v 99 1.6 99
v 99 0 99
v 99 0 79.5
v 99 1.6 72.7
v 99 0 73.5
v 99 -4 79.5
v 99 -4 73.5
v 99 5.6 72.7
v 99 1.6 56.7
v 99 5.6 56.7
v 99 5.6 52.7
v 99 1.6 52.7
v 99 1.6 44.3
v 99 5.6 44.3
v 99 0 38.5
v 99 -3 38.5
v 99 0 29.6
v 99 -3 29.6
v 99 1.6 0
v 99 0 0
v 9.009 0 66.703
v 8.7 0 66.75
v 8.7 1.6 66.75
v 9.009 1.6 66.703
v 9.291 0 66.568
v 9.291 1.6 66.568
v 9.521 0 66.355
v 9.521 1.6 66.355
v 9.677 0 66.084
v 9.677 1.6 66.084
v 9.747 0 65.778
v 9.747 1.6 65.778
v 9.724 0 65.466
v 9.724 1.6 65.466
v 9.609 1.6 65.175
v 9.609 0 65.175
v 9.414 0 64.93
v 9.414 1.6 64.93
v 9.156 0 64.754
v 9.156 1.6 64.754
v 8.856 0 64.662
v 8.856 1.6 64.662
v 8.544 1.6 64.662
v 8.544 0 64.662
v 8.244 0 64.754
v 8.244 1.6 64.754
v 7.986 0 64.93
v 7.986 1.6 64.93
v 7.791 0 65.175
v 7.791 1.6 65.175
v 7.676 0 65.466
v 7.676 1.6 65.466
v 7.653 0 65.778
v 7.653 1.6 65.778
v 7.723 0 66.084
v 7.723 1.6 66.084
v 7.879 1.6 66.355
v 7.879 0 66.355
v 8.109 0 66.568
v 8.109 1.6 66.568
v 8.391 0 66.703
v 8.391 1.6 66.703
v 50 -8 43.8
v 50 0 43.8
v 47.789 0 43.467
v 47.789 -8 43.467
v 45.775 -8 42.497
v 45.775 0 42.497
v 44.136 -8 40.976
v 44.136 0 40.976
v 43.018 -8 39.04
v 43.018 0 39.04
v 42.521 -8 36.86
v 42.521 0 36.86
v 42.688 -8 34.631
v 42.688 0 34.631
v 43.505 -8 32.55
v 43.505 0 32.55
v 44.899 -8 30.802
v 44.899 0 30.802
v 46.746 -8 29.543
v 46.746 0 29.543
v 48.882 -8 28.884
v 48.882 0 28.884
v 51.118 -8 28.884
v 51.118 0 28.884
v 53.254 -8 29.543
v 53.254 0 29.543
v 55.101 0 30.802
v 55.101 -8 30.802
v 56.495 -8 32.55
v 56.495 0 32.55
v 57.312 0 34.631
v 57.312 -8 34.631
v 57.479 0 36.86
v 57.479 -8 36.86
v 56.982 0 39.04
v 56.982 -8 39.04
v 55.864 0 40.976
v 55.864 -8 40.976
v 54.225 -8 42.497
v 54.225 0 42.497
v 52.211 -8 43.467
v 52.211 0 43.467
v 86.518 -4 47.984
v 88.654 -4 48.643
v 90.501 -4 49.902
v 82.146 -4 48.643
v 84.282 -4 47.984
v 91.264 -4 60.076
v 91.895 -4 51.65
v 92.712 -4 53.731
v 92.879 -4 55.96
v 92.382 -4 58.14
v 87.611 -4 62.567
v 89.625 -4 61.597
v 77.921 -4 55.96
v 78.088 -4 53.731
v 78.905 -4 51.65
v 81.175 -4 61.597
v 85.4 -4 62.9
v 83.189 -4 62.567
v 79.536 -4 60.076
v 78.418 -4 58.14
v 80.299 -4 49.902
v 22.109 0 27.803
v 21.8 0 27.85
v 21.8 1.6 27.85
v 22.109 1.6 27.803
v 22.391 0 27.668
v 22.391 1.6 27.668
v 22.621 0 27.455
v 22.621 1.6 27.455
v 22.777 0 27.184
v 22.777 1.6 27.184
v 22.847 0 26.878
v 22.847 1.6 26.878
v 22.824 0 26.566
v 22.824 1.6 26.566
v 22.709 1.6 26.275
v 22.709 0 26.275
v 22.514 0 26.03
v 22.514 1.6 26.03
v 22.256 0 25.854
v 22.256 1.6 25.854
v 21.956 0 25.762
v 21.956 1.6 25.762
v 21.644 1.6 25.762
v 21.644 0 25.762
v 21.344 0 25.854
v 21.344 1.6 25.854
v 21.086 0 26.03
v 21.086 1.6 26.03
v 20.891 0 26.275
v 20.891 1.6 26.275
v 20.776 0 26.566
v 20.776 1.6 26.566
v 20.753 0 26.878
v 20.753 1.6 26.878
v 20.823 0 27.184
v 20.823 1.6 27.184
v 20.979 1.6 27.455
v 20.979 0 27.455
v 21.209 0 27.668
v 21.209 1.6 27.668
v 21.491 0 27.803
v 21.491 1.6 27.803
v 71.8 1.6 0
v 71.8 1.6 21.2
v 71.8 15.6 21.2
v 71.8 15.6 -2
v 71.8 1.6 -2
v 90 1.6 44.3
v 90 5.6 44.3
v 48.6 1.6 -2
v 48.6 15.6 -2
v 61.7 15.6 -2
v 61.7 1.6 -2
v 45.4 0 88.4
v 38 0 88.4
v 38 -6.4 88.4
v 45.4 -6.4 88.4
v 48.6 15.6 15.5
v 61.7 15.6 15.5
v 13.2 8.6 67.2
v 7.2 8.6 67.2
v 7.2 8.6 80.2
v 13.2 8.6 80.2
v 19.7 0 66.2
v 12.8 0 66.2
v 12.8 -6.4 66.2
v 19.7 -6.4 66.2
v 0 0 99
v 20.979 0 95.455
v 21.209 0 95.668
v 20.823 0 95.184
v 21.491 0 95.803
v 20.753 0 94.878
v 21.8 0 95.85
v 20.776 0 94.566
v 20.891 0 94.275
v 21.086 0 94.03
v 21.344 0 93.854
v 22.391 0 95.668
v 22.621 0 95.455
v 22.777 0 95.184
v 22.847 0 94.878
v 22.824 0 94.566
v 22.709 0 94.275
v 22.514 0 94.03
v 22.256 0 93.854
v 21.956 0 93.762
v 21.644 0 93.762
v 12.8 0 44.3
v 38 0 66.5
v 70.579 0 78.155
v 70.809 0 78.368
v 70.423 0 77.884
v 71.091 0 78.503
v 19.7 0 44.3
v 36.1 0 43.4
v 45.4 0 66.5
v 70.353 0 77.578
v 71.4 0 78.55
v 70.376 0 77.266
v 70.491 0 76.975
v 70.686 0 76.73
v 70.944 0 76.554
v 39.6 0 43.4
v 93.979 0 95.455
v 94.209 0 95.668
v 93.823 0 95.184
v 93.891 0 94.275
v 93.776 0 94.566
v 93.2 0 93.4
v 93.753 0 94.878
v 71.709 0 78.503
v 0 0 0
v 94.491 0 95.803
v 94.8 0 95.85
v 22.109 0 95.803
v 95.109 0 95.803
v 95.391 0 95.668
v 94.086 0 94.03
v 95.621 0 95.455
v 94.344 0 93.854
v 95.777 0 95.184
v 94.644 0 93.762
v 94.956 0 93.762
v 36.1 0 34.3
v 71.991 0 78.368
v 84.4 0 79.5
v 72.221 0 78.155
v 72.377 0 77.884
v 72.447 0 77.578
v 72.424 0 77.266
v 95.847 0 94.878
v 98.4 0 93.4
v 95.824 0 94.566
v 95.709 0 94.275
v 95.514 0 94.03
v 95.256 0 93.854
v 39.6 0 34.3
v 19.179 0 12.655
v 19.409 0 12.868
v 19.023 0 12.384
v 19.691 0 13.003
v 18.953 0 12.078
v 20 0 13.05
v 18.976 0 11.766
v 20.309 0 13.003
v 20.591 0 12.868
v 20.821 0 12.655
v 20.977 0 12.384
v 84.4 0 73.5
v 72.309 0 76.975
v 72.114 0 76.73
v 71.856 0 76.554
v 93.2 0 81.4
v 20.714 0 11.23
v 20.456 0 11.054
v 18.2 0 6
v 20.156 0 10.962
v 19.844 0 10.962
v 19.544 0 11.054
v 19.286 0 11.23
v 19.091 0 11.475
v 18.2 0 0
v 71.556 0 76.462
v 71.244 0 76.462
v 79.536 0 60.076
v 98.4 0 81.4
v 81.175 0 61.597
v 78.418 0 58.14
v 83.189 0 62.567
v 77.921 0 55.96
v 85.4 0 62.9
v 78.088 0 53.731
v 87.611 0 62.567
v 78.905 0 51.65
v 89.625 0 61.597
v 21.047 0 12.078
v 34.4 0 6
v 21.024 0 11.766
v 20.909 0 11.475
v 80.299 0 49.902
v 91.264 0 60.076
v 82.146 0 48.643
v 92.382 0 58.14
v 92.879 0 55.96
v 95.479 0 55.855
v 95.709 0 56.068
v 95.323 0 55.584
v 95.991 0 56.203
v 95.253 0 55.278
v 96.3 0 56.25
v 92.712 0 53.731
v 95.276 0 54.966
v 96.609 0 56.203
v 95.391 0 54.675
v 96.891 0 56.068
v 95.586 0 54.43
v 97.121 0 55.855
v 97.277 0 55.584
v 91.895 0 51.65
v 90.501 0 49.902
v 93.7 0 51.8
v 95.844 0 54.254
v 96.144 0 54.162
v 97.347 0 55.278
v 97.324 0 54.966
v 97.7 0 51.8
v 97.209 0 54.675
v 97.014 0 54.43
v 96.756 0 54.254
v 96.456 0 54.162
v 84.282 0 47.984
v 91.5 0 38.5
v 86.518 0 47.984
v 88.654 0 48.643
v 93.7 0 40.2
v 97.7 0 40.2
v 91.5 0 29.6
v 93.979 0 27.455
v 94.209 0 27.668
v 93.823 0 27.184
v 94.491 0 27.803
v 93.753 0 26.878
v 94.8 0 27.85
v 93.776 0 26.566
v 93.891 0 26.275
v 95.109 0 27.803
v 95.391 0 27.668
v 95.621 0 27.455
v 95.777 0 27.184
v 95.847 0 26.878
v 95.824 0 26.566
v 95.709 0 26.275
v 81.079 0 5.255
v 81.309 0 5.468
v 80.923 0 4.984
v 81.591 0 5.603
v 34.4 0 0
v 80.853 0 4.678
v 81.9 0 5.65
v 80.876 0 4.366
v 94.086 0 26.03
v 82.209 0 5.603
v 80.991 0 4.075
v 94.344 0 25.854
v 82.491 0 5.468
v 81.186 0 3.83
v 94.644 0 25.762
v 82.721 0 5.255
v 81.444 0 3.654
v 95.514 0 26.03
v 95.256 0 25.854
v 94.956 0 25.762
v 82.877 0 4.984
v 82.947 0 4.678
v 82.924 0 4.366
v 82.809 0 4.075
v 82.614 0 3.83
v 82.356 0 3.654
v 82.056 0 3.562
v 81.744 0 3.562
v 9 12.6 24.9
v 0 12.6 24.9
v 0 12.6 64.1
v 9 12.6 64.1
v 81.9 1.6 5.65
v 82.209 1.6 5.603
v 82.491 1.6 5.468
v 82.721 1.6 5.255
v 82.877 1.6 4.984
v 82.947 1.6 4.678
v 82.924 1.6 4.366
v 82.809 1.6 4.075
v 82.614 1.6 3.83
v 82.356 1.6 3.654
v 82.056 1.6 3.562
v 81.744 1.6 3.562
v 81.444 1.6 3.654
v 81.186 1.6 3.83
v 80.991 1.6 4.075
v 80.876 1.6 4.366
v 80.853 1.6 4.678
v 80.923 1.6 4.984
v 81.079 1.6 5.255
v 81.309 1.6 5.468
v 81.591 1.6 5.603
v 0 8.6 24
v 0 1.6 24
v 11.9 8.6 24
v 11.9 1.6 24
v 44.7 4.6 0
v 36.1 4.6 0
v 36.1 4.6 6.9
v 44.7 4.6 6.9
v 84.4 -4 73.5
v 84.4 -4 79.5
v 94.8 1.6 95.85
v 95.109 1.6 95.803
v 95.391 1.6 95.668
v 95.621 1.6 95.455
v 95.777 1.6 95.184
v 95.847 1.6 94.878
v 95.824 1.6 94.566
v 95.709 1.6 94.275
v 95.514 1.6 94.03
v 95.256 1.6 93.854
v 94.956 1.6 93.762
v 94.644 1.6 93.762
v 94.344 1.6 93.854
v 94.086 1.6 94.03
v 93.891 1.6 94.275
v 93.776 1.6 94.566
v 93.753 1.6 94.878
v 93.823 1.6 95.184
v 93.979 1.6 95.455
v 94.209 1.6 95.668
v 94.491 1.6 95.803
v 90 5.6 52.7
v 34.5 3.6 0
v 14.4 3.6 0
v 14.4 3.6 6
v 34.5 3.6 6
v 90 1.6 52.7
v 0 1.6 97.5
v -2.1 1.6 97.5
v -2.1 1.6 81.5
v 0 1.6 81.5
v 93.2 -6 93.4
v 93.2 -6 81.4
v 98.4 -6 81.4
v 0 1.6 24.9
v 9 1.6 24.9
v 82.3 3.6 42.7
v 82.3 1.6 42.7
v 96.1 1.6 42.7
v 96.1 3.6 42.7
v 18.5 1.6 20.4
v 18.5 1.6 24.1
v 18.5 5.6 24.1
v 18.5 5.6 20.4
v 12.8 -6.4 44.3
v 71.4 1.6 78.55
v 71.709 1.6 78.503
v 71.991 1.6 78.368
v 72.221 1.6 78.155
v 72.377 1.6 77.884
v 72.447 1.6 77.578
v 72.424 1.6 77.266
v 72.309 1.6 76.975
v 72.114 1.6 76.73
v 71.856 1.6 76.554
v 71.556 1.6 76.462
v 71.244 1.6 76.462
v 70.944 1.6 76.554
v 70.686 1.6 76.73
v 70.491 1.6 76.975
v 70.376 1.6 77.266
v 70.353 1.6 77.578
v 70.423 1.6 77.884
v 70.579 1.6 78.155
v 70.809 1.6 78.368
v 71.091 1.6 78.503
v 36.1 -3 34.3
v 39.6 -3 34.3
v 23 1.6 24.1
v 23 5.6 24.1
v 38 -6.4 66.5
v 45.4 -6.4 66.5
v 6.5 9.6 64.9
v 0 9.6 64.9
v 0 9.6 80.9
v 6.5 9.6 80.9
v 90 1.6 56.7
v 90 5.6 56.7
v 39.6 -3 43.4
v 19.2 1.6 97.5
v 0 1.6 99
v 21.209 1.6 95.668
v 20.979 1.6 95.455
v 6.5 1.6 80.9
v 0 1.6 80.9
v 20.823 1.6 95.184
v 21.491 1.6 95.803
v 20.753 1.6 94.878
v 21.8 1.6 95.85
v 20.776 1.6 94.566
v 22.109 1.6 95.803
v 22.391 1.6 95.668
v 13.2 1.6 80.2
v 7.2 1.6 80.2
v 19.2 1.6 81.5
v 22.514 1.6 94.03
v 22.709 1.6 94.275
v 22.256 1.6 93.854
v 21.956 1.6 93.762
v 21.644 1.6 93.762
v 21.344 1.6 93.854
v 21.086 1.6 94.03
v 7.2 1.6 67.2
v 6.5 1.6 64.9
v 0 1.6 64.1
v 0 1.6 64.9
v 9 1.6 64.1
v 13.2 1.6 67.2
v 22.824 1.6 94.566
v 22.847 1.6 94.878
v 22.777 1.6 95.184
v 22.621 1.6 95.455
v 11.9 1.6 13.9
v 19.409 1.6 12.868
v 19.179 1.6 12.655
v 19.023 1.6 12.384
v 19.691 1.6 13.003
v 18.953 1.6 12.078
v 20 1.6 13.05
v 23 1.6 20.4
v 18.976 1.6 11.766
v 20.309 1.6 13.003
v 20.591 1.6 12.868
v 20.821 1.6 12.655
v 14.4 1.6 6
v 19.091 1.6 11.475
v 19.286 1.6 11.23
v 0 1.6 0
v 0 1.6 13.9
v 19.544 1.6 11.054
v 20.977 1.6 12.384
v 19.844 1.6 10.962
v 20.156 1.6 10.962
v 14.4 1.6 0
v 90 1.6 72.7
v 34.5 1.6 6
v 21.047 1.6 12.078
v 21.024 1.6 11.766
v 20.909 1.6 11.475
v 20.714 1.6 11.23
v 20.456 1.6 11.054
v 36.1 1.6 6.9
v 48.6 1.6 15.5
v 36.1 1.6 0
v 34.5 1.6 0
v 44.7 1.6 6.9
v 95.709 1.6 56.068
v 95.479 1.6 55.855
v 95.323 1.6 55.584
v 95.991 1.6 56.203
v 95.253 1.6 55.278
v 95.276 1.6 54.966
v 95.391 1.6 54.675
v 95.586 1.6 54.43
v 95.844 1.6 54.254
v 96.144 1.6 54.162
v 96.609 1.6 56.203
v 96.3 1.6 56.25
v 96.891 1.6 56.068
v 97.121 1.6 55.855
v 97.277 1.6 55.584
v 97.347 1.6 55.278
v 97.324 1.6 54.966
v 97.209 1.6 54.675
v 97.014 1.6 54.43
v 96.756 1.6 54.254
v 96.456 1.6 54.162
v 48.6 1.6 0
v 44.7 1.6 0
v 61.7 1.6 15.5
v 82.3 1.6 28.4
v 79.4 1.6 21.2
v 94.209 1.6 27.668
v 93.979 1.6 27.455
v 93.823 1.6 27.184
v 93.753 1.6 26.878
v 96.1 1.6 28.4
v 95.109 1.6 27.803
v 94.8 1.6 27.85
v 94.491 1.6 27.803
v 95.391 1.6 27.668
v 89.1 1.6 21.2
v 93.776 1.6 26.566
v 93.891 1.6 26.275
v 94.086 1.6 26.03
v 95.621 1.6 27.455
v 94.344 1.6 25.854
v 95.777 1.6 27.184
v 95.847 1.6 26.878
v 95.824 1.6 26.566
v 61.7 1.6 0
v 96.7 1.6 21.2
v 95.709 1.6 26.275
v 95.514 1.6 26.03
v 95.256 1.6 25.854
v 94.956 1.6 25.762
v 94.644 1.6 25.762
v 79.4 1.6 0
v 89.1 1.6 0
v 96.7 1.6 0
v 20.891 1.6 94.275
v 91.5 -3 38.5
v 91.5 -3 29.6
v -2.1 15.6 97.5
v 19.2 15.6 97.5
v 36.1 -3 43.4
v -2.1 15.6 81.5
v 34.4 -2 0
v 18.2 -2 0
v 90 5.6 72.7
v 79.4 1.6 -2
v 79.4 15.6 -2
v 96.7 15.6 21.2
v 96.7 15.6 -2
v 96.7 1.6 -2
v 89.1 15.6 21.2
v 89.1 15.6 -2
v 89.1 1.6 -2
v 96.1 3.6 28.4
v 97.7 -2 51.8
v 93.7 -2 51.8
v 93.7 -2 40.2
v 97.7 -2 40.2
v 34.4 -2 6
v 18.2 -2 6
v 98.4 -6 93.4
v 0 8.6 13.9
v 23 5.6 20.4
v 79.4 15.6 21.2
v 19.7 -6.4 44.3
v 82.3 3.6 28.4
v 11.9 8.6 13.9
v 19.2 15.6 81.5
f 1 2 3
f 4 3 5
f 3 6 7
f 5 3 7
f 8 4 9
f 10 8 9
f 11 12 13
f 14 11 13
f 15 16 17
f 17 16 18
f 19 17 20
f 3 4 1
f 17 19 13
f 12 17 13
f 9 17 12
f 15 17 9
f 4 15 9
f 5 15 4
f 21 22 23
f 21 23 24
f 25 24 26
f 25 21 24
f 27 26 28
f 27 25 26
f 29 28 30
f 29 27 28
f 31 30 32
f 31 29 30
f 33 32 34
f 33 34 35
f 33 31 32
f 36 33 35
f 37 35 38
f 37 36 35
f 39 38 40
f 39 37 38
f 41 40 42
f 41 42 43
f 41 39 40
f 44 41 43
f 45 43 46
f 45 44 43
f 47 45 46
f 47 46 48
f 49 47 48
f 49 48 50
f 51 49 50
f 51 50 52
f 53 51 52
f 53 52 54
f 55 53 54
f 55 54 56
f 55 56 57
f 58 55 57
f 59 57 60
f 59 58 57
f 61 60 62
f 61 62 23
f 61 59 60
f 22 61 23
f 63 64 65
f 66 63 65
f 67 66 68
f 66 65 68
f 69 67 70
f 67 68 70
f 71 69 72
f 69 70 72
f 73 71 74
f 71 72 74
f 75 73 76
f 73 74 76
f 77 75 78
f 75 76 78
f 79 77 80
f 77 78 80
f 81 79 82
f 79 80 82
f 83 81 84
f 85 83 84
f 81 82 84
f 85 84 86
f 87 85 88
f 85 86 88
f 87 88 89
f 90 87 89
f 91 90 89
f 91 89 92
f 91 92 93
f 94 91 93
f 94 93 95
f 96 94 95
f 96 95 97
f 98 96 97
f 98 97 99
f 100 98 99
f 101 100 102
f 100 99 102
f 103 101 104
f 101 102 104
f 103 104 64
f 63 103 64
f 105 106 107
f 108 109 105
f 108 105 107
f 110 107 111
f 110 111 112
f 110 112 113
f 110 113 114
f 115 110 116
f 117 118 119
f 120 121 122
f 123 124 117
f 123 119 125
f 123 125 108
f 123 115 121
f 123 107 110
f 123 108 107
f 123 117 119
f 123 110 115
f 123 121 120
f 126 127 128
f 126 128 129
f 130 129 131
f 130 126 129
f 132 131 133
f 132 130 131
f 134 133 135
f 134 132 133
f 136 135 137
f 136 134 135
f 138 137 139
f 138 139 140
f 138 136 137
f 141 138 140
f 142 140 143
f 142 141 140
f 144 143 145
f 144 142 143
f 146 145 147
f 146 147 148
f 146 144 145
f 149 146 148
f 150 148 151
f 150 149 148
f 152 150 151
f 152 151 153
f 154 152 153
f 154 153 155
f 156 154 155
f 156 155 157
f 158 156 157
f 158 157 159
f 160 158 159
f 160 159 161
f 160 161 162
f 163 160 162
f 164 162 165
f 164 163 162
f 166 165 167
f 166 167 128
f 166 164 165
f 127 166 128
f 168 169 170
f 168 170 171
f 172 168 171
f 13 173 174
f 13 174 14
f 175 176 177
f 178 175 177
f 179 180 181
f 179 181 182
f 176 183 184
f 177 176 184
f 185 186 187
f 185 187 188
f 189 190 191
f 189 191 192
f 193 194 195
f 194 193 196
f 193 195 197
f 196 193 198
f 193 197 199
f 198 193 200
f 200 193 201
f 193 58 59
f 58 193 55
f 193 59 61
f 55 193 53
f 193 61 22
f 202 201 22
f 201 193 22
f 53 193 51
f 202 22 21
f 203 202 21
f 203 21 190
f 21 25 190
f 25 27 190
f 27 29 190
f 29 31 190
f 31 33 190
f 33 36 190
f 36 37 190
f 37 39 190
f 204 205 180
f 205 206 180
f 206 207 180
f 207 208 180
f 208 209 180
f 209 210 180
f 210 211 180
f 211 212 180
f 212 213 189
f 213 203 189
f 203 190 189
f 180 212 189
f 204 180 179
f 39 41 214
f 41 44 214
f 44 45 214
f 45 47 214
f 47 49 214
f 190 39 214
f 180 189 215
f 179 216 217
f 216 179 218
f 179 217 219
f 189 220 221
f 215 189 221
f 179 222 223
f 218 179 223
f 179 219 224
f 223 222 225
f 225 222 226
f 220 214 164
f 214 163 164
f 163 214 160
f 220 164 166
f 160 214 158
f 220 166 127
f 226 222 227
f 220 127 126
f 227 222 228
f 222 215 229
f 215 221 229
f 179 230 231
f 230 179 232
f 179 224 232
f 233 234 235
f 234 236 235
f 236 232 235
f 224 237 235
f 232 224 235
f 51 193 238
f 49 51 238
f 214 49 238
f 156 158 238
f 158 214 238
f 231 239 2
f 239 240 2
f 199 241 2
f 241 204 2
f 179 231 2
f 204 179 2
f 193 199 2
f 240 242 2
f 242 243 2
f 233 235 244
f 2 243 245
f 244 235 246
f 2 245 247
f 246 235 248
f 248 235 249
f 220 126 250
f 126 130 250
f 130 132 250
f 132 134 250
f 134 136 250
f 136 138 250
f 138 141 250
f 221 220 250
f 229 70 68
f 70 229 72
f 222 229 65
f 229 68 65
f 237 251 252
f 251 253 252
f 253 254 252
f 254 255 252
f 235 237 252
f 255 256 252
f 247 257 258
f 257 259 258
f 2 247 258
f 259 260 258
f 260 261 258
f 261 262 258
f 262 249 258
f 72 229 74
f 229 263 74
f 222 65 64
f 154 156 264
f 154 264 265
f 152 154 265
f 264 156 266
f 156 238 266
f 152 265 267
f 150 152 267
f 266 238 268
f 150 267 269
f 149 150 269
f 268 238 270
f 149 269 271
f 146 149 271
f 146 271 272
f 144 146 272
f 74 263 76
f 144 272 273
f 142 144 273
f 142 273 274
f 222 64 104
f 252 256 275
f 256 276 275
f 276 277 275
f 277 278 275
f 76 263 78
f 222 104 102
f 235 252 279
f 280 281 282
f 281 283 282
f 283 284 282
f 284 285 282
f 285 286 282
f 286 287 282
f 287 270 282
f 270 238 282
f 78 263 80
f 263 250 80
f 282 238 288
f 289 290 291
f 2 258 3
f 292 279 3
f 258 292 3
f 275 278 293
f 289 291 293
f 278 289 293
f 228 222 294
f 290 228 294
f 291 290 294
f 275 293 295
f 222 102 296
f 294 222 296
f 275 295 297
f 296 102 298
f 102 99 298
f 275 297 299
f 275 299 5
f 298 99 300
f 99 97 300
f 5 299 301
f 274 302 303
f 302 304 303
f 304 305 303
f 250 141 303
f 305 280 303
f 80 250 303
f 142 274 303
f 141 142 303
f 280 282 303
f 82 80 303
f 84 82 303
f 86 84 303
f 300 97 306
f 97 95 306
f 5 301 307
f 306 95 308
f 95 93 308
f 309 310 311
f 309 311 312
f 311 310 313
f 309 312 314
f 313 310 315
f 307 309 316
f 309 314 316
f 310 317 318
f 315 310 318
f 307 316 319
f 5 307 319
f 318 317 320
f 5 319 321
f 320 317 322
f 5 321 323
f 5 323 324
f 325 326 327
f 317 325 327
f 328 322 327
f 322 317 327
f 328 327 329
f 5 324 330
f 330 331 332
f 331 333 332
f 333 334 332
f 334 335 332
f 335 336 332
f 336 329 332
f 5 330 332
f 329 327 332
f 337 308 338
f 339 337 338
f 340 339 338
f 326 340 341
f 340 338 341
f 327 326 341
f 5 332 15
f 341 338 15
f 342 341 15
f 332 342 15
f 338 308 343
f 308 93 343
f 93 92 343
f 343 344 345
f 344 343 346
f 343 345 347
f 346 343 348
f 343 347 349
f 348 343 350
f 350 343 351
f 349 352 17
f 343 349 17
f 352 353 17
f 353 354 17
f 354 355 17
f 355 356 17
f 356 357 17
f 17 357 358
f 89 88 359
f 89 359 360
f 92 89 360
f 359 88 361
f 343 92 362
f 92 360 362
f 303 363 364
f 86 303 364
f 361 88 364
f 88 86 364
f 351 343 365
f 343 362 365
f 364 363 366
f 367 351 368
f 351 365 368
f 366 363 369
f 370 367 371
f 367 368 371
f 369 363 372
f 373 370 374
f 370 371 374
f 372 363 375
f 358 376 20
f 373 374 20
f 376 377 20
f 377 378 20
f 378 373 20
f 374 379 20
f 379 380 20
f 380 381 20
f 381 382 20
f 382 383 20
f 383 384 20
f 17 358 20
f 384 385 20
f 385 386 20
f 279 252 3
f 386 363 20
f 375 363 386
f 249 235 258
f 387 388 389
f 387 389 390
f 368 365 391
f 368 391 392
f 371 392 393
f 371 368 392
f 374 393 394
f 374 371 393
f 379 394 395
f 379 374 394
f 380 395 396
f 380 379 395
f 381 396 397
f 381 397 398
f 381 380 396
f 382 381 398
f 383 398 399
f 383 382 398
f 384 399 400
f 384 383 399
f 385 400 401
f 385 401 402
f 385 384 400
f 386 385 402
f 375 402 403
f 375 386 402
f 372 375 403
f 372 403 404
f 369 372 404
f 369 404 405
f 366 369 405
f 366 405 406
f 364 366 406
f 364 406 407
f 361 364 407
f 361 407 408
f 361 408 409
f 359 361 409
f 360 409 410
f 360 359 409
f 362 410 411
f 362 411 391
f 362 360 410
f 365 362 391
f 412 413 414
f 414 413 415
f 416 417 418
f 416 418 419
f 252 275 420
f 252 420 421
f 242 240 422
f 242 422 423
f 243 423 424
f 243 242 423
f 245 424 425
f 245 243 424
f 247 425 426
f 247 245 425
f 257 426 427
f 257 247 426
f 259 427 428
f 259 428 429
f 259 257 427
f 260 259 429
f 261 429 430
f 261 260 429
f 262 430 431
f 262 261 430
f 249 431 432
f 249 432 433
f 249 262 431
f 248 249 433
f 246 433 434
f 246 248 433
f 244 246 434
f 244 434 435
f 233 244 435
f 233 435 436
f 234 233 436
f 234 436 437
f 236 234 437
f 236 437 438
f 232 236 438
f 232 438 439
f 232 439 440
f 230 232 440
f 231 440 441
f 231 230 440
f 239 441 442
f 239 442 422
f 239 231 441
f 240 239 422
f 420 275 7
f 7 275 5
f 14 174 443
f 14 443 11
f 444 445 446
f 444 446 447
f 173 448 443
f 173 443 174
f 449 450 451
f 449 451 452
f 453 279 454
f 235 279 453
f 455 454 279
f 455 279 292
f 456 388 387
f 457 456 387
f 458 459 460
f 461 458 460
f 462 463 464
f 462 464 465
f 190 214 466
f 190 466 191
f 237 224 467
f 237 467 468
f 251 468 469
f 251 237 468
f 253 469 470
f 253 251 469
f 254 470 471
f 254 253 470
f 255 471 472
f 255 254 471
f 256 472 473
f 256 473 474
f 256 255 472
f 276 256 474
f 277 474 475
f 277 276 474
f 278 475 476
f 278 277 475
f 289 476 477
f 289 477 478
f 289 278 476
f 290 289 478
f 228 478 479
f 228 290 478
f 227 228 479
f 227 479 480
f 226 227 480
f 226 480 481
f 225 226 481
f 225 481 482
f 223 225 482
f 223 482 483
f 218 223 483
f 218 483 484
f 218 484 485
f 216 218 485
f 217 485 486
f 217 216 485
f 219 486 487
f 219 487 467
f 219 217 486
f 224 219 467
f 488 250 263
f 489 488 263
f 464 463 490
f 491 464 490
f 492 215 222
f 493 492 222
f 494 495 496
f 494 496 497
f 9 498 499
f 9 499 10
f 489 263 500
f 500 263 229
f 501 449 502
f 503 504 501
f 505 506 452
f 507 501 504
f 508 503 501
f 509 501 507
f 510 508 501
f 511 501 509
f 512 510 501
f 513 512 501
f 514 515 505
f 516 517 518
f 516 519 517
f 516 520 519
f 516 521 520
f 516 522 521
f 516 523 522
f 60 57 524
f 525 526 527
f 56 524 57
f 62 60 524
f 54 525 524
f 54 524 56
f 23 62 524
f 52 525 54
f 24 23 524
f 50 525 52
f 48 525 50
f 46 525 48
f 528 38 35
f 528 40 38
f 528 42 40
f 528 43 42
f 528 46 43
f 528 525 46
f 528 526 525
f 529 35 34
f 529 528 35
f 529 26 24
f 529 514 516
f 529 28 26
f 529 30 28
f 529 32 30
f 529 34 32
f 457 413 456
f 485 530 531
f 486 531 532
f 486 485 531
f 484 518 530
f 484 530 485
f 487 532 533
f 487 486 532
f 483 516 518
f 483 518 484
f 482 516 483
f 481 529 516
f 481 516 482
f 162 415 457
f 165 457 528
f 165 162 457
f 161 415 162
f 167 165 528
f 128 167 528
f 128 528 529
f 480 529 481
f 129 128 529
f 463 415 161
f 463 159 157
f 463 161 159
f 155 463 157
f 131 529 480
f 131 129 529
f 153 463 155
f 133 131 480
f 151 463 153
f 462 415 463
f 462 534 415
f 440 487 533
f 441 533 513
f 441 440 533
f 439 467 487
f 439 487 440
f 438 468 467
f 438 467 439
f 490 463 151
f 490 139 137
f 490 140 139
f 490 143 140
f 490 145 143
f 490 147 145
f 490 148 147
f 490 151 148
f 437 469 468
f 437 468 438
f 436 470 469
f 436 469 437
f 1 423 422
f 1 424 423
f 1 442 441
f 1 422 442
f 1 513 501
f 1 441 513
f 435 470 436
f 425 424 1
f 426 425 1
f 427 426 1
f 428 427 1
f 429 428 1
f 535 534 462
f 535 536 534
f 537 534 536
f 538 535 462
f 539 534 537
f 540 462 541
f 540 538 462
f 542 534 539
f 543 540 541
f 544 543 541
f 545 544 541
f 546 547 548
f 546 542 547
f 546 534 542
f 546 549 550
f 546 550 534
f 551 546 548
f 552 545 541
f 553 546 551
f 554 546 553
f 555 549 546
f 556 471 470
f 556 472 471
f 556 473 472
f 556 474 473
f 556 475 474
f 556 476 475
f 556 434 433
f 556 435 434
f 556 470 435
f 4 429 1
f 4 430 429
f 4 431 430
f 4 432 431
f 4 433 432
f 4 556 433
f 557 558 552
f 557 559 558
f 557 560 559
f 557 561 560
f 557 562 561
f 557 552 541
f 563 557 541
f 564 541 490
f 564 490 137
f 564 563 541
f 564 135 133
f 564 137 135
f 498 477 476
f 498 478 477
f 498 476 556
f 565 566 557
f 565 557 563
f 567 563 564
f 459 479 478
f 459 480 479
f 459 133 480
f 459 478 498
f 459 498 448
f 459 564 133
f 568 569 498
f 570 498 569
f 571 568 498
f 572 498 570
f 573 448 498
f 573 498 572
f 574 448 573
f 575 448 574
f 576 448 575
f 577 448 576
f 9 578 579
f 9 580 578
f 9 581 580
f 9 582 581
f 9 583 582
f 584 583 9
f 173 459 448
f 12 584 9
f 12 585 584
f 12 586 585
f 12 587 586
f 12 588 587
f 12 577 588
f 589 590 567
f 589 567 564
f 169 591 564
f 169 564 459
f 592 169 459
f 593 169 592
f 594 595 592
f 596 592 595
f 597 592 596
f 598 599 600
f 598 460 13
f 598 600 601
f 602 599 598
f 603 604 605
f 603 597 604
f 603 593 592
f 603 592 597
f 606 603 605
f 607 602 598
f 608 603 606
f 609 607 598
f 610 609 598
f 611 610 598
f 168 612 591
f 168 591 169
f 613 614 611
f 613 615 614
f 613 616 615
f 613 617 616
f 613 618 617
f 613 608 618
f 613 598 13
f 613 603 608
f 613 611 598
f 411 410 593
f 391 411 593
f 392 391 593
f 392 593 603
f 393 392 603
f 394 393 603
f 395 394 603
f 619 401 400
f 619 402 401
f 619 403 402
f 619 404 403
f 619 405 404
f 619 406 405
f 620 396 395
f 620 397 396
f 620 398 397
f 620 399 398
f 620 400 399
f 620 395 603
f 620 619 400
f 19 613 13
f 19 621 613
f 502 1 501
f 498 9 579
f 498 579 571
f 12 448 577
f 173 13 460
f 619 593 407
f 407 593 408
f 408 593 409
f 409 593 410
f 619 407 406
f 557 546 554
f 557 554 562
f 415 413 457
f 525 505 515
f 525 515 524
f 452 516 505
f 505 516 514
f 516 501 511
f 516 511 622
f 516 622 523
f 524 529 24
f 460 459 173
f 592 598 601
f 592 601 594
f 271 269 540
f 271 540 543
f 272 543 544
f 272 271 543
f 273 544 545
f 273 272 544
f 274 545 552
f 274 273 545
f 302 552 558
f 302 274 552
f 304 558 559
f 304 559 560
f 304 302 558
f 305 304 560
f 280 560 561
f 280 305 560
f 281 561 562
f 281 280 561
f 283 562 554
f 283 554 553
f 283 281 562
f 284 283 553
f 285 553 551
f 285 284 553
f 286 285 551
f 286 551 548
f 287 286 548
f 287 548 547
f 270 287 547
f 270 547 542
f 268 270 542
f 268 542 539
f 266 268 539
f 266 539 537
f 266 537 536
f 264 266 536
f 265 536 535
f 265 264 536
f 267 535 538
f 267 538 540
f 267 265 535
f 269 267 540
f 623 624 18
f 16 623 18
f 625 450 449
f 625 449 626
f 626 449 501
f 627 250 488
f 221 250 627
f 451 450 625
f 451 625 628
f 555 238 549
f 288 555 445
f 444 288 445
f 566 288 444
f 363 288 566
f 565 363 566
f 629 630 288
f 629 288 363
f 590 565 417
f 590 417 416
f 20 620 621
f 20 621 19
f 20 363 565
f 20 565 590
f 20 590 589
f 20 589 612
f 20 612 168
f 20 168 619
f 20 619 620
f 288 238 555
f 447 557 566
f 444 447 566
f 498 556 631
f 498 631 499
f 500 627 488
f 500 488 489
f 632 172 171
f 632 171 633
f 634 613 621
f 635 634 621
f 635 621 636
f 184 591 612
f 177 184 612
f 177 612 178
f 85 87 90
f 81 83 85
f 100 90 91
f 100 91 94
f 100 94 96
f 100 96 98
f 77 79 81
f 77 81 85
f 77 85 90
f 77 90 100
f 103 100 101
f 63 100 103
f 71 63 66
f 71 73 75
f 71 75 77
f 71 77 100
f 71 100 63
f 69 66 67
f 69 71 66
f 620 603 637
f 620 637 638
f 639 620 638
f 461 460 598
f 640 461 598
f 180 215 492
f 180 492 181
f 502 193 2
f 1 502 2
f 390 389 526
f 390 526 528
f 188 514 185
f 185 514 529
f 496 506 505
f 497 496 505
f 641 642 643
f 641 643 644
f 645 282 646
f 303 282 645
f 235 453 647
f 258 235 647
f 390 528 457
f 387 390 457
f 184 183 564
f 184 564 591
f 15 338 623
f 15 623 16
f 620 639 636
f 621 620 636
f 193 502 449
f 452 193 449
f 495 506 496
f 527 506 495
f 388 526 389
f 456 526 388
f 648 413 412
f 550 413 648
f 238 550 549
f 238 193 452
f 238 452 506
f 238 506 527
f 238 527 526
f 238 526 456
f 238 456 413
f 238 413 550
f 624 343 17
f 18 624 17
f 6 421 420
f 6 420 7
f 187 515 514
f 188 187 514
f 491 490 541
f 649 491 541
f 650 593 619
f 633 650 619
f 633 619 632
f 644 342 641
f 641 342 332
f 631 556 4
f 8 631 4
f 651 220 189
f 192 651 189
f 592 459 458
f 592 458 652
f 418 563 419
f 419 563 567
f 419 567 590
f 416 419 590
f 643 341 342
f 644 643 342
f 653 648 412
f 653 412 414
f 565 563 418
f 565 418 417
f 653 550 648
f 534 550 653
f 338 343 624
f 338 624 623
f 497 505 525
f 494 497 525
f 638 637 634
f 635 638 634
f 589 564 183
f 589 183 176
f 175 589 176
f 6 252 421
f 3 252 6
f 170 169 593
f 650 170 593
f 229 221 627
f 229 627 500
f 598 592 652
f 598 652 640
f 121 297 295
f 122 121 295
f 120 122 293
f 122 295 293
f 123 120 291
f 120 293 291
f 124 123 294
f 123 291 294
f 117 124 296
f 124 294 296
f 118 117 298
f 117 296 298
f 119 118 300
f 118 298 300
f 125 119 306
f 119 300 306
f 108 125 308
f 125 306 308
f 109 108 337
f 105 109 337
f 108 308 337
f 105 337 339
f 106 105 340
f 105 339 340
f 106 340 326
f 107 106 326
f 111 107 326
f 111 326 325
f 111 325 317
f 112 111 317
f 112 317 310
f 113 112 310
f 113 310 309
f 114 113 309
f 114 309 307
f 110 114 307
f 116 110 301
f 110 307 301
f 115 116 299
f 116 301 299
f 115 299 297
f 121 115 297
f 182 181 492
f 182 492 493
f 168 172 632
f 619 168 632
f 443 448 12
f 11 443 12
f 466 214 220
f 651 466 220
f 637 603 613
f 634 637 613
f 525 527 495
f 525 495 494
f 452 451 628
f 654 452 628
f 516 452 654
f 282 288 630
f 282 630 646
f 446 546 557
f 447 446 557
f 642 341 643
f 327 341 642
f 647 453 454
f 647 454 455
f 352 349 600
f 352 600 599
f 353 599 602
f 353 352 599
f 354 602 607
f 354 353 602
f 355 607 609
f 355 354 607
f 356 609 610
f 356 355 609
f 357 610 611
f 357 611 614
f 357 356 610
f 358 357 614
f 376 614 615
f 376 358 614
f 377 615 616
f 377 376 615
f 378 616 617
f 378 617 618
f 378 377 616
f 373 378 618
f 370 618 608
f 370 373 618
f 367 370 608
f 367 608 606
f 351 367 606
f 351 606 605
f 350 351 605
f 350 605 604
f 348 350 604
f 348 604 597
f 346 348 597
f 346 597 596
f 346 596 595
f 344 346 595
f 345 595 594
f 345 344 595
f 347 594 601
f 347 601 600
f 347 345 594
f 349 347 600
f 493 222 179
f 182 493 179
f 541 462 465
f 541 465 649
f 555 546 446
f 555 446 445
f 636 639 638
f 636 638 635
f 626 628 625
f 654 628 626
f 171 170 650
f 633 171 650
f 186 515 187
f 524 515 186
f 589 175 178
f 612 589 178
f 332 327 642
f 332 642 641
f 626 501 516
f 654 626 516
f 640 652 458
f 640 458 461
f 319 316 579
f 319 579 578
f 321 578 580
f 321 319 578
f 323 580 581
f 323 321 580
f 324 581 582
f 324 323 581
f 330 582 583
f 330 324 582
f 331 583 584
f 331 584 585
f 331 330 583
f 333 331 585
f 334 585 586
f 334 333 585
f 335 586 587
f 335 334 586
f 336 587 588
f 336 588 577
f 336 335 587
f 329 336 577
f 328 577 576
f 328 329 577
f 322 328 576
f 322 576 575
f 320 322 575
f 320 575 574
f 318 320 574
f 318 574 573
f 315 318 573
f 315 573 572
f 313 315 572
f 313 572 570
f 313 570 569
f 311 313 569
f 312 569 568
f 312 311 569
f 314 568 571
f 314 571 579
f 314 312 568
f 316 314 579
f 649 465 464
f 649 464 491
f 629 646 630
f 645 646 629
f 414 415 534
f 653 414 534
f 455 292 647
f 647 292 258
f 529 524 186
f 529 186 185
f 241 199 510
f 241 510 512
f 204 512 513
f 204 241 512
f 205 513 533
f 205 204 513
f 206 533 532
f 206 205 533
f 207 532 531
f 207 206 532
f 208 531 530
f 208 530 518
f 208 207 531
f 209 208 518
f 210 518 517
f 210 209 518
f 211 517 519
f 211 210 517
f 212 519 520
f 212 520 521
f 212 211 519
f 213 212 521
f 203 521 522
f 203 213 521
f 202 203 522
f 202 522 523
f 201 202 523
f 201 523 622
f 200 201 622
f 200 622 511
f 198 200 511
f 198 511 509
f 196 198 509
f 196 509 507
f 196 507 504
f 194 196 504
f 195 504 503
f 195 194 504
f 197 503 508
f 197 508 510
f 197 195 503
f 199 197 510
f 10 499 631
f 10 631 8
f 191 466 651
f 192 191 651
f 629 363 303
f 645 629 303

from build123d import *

# Parameters (mm, degrees)
SKETCH_1_W       = 99
SKETCH_1_H       = 99
SKETCH_1_R       = 1.05
EXTRUDE_1_DEPTH  = 1.6
SKETCH_2_W       = 7.6
SKETCH_2_H       = 23.2
SKETCH_2_W_2     = 13.1
SKETCH_2_H_2     = 17.5
SKETCH_2_W_3     = 21.3
SKETCH_2_H_3     = 16
EXTRUDE_2_DEPTH  = 14
SKETCH_3_W       = 8.6
SKETCH_3_H       = 6.9
EXTRUDE_3_DEPTH  = 3
SKETCH_4_W       = 20.1
SKETCH_4_H       = 6
SKETCH_4_W_2     = 13.8
SKETCH_4_H_2     = 14.3
EXTRUDE_4_DEPTH  = 2
SKETCH_5_W       = 11.9
SKETCH_5_H       = 10.1
SKETCH_5_W_2     = 6
SKETCH_5_H_2     = 13
EXTRUDE_5_DEPTH  = 7
SKETCH_6_W       = 9
SKETCH_6_H       = 39.2
EXTRUDE_6_DEPTH  = 11
SKETCH_7_W       = 6.5
SKETCH_7_H       = 16
EXTRUDE_7_DEPTH  = 8
SKETCH_8_W       = 9
SKETCH_8_H       = 16
SKETCH_8_H_2     = 8.4
SKETCH_8_W_2     = 4.5
SKETCH_8_H_3     = 3.7
EXTRUDE_8_DEPTH  = 4
SKETCH_9_W       = 5.2
SKETCH_9_H       = 12
EXTRUDE_9_DEPTH  = 6
SKETCH_10_R      = 7.5
SKETCH_10_W      = 14.6
SKETCH_10_H      = 6
EXTRUDE_10_DEPTH = 4
SKETCH_11_W      = 4
SKETCH_11_H      = 11.6
SKETCH_11_W_2    = 16.2
SKETCH_11_H_2    = 6
EXTRUDE_11_DEPTH = 2
SKETCH_12_W      = 7.5
SKETCH_12_H      = 8.9
SKETCH_12_W_2    = 3.5
SKETCH_12_H_2    = 9.1
EXTRUDE_12_DEPTH = 3
SKETCH_13_W      = 7.4
SKETCH_13_H      = 21.9
SKETCH_13_W_2    = 6.9
EXTRUDE_13_DEPTH = 6.4
SKETCH_14_R      = 7.5
EXTRUDE_14_DEPTH = 8


with BuildPart() as part:
    # 草图1 → 凸台-拉伸1 (new body)
    with BuildSketch(Plane(origin=(0, 0, 0), x_dir=(1, 0, 0), z_dir=(0, 1, 0))):
        with Locations((49.5, -49.5)):
            Rectangle(SKETCH_1_W, SKETCH_1_H)
        with Locations(Location((21.8, -26.8, 0), (0, 0, 270))):
            Circle(SKETCH_1_R, mode=Mode.SUBTRACT)
        with Locations(Location((94.8, -26.8, 0), (0, 0, 270))):
            Circle(SKETCH_1_R, mode=Mode.SUBTRACT)
        with Locations(Location((21.8, -94.8, 0), (0, 0, 270))):
            Circle(SKETCH_1_R, mode=Mode.SUBTRACT)
        with Locations(Location((94.8, -94.8, 0), (0, 0, 270))):
            Circle(SKETCH_1_R, mode=Mode.SUBTRACT)
        with Locations(Location((8.7, -65.7, 0), (0, 0, 270))):
            Circle(SKETCH_1_R, mode=Mode.SUBTRACT)
        with Locations(Location((81.9, -4.6, 0), (0, 0, 270))):
            Circle(SKETCH_1_R, mode=Mode.SUBTRACT)
        with Locations(Location((96.3, -55.2, 0), (0, 0, 270))):
            Circle(SKETCH_1_R, mode=Mode.SUBTRACT)
        with Locations(Location((20, -12, 0), (0, 0, 270))):
            Circle(SKETCH_1_R, mode=Mode.SUBTRACT)
        with Locations(Location((71.4, -77.5, 0), (0, 0, 270))):
            Circle(SKETCH_1_R, mode=Mode.SUBTRACT)
    extrude(amount=EXTRUDE_1_DEPTH)

    # 草图2 → 凸台-拉伸2 (add)
    with BuildSketch(Plane(origin=(0, 1.6, 0), x_dir=(1, 0, 0), z_dir=(0, 1, 0))):
        with Locations((92.9, -9.6)):
            Rectangle(SKETCH_2_W, SKETCH_2_H)
        with Locations((75.6, -9.6)):
            Rectangle(SKETCH_2_W, SKETCH_2_H)
        with Locations((55.15, -6.75)):
            Rectangle(SKETCH_2_W_2, SKETCH_2_H_2)
        with Locations((8.55, -89.5)):
            Rectangle(SKETCH_2_W_3, SKETCH_2_H_3)
    extrude(amount=EXTRUDE_2_DEPTH)

    # 草图3 → 凸台-拉伸3 (add)
    with BuildSketch(Plane(origin=(0, 1.6, 0), x_dir=(1, 0, 0), z_dir=(0, 1, 0))):
        with Locations((40.4, -3.45)):
            Rectangle(SKETCH_3_W, SKETCH_3_H)
    extrude(amount=EXTRUDE_3_DEPTH)

    # 草图4 → 凸台-拉伸4 (add)
    with BuildSketch(Plane(origin=(0, 1.6, 0), x_dir=(1, 0, 0), z_dir=(0, 1, 0))):
        with Locations((24.45, -3)):
            Rectangle(SKETCH_4_W, SKETCH_4_H)
        with Locations((89.2, -35.55)):
            Rectangle(SKETCH_4_W_2, SKETCH_4_H_2)
    extrude(amount=EXTRUDE_4_DEPTH)

    # 草图5 → 凸台-拉伸5 (add)
    with BuildSketch(Plane(origin=(0, 1.6, 0), x_dir=(1, 0, 0), z_dir=(0, 1, 0))):
        with Locations((5.95, -18.95)):
            Rectangle(SKETCH_5_W, SKETCH_5_H)
        with Locations((10.2, -73.7)):
            Rectangle(SKETCH_5_W_2, SKETCH_5_H_2)
    extrude(amount=EXTRUDE_5_DEPTH)

    # 草图6 → 凸台-拉伸6 (add)
    with BuildSketch(Plane(origin=(0, 1.6, 0), x_dir=(1, 0, 0), z_dir=(0, 1, 0))):
        with Locations((4.5, -44.5)):
            Rectangle(SKETCH_6_W, SKETCH_6_H)
    extrude(amount=EXTRUDE_6_DEPTH)

    # 草图7 → 凸台-拉伸7 (add)
    with BuildSketch(Plane(origin=(0, 1.6, 0), x_dir=(1, 0, 0), z_dir=(0, 1, 0))):
        with Locations((3.25, -72.9)):
            Rectangle(SKETCH_7_W, SKETCH_7_H)
    extrude(amount=EXTRUDE_7_DEPTH)

    # 草图8 → 凸台-拉伸8 (add)
    with BuildSketch(Plane(origin=(0, 1.6, 0), x_dir=(1, 0, 0), z_dir=(0, 1, 0))):
        with Locations((94.5, -64.7)):
            Rectangle(SKETCH_8_W, SKETCH_8_H)
        with Locations((94.5, -48.5)):
            Rectangle(SKETCH_8_W, SKETCH_8_H_2)
        with Locations((20.75, -22.25)):
            Rectangle(SKETCH_8_W_2, SKETCH_8_H_3)
    extrude(amount=EXTRUDE_8_DEPTH)

    # 草图9 → 凸台-拉伸9 (add)
    with BuildSketch(Plane.XZ):
        with Locations((95.8, 87.4)):
            Rectangle(SKETCH_9_W, SKETCH_9_H)
    extrude(amount=EXTRUDE_9_DEPTH)

    # 草图10 → 凸台-拉伸10 (add)
    with BuildSketch(Plane.XZ):
        with Locations(Location((85.4, 55.4, 0), (0, 0, 90))):
            Circle(SKETCH_10_R)
        with Locations((91.7, 76.5)):
            Rectangle(SKETCH_10_W, SKETCH_10_H)
    extrude(amount=EXTRUDE_10_DEPTH)

    # 草图11 → 凸台-拉伸11 (add)
    with BuildSketch(Plane.XZ):
        with Locations((95.7, 46)):
            Rectangle(SKETCH_11_W, SKETCH_11_H)
        with Locations((26.3, 3)):
            Rectangle(SKETCH_11_W_2, SKETCH_11_H_2)
    extrude(amount=EXTRUDE_11_DEPTH)

    # 草图12 → 凸台-拉伸12 (add)
    with BuildSketch(Plane.XZ):
        with Locations((95.25, 34.05)):
            Rectangle(SKETCH_12_W, SKETCH_12_H)
        with Locations((37.85, 38.85)):
            Rectangle(SKETCH_12_W_2, SKETCH_12_H_2)
    extrude(amount=EXTRUDE_12_DEPTH)

    # 草图13 → 凸台-拉伸13 (add)
    with BuildSketch(Plane.XZ):
        with Locations((41.7, 77.45)):
            Rectangle(SKETCH_13_W, SKETCH_13_H)
        with Locations((16.25, 55.25)):
            Rectangle(SKETCH_13_W_2, SKETCH_13_H)
    extrude(amount=EXTRUDE_13_DEPTH)

    # 草图14 → 凸台-拉伸14 (add)
    with BuildSketch(Plane.XZ):
        with Locations(Location((50, 36.3, 0), (0, 0, 90))):
            Circle(SKETCH_14_R)
    extrude(amount=EXTRUDE_14_DEPTH)


solid = part.part
